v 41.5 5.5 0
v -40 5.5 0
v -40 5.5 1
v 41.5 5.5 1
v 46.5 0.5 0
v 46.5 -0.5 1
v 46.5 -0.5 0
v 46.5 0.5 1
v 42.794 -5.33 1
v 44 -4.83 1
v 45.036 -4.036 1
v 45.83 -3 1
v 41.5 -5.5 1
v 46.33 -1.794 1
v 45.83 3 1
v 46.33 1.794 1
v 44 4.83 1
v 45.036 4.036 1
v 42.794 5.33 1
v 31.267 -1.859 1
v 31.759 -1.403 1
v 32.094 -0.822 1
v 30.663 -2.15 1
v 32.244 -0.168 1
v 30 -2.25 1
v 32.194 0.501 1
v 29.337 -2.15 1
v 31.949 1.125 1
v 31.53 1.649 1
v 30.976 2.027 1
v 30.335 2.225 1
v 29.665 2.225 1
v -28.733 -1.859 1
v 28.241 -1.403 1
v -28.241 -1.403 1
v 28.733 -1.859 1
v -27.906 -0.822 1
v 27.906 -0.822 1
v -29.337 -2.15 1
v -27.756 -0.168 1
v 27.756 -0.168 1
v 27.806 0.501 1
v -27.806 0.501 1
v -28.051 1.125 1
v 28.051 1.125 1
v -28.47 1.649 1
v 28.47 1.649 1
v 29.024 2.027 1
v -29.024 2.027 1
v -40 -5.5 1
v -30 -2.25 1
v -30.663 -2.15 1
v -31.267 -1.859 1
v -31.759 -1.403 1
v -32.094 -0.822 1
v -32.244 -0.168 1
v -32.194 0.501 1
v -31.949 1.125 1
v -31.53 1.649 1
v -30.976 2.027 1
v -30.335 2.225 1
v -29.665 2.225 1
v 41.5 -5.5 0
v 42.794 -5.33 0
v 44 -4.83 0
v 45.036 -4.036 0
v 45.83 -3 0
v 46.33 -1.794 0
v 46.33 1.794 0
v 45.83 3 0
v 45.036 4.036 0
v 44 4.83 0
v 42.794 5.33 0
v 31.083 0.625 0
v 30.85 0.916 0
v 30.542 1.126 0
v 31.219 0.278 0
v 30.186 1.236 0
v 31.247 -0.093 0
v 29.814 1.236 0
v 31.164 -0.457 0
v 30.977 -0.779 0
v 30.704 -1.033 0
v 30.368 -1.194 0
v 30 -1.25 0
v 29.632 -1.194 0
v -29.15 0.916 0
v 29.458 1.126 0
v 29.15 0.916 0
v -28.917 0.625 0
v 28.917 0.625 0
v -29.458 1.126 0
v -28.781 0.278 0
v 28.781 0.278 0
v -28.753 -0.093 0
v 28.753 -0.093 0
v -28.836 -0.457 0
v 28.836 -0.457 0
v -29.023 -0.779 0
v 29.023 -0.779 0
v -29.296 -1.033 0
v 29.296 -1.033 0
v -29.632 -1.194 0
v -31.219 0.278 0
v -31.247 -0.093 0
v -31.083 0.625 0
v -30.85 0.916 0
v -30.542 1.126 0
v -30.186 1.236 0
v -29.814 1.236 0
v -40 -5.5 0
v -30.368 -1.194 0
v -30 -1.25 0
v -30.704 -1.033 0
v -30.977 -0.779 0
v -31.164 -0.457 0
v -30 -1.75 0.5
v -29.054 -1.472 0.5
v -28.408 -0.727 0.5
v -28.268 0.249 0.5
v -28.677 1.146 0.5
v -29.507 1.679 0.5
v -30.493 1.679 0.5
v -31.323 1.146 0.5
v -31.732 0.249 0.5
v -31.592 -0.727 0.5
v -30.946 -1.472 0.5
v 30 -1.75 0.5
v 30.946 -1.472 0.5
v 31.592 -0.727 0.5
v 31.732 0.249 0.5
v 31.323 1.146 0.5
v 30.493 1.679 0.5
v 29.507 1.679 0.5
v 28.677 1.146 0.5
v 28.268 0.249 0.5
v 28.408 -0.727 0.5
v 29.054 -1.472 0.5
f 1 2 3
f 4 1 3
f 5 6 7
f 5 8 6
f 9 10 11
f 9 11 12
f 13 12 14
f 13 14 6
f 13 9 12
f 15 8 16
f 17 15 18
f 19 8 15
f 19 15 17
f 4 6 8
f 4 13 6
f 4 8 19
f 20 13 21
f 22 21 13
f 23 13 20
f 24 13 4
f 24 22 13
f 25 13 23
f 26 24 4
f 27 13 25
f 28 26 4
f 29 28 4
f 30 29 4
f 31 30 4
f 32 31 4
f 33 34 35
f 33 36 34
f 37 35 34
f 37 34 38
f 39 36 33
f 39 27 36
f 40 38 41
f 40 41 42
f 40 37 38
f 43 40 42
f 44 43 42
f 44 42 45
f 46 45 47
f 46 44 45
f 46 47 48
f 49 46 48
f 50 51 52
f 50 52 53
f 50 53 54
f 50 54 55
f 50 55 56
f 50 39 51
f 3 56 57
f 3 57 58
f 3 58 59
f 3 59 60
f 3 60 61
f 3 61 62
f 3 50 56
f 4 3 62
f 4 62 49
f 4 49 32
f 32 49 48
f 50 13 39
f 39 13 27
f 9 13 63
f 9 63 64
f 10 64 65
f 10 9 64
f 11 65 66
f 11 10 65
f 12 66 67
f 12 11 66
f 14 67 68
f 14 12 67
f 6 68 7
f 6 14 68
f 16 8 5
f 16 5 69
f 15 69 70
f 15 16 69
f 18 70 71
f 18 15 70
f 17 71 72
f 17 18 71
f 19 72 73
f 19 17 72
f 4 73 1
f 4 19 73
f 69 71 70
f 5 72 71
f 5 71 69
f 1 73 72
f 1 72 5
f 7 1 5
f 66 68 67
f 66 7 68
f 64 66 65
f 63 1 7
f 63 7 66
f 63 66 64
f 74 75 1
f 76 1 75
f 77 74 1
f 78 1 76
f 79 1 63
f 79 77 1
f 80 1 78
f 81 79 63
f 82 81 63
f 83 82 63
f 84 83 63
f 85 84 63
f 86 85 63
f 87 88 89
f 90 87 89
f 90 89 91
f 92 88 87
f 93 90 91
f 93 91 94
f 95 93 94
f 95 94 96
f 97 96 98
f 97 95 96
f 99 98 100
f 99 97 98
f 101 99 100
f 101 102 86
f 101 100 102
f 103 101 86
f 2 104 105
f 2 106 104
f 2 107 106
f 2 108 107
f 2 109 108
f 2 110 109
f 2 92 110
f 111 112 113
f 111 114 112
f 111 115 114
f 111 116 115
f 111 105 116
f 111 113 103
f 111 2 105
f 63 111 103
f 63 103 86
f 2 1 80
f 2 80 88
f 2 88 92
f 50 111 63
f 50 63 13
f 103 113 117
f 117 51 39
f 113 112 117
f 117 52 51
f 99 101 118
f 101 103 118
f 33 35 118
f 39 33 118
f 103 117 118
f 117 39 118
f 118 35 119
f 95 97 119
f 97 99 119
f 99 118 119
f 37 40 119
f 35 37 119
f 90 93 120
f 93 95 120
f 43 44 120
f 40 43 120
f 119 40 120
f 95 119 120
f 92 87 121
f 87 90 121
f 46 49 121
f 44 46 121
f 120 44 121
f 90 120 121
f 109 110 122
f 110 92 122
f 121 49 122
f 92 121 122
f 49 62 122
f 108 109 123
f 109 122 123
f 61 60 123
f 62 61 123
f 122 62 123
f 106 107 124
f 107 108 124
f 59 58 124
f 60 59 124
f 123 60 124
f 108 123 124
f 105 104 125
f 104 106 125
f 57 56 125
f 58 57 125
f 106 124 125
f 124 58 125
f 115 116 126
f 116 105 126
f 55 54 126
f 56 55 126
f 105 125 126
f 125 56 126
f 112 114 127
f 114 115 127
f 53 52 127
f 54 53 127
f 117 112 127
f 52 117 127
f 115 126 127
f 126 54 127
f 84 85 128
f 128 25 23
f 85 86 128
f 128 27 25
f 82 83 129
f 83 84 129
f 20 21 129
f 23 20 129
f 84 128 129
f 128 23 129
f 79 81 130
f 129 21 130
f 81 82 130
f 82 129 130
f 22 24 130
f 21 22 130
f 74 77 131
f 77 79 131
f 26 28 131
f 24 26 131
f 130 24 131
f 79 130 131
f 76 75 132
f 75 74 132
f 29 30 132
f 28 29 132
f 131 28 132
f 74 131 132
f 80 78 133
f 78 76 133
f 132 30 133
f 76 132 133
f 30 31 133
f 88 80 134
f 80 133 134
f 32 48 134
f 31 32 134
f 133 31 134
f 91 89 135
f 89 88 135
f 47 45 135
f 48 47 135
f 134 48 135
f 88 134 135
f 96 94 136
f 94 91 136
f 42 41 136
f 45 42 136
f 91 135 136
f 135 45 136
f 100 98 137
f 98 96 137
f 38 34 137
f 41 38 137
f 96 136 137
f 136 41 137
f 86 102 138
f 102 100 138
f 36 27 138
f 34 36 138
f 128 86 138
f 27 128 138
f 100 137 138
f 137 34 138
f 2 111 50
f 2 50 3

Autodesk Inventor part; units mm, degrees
ref_plane "YZ Plane" through (0, 0, 0) normal (1, 0, 0) x (0, 1, 0)
ref_plane "XZ Plane" through (0, 0, 0) normal (0, 1, 0) x (-1, 0, 0)
ref_plane "XY Plane" through (0, 0, 0) normal (0, 0, 1) x (1, 0, 0)
sketch "Skizze1" plane through (0, 0, 0) normal (0, 0, 1) x (1, 0, 0)
  line L0 (-56, 0) -> (56, 0) projected
  line L1 (0, -7.7) -> (0, 7.7) projected
  line L2 (-40, 5.5) -> (40, 5.5)
  line L3 (40, 5.5) -> (40, -5.5)
  line L4 (40, -5.5) -> (-40, -5.5)
  line L5 (-40, -5.5) -> (-40, 5.5)
  point P0 (0, 0)
  dimension "d0" = 11
  dimension "d1" = 80
extrude "Extrusion1" add sketch "Skizze1" along normal blind 1
sketch "Skizze2" plane through (0, 0, 1) normal (0, 0, 1) x (1, 0, 0)
  line L0 (-140, 0) -> (140, 0) projected
  line L1 (0, -7.7) -> (0, 7.7) projected
  point P0 (0, 0)
  point P1 (-30, 0)
  point P2 (30, 0)
  dimension "d4" = 60
hole "Bohrung1" at (-30, 0, 1) at (30, 0, 1) direction (0, 0, -1) diameter 2.4 end through all countersink diameter 4.5 countersink angle 90
sketch "Skizze3" plane through (40, -5.5, 0) normal (1, 0, 0) x (0, 0, -1)
  line L0 (0, 11) -> (0, 0) projected
  line L1 (0, 11) -> (-1, 11) projected
  line L2 (-1, 0) -> (-1, 11) projected
  line L3 (0, 0) -> (-1, 0) projected
  point P0 (0, 5.5)
extrude "Extrusion2" add sketch "Skizze3" along normal blind 6.5
fillet "Rundung1" radius 5 2 edges at (46.5, -5.5, 0.5) (46.5, 5.5, 0.5)
properties part number "13_1087_041"
